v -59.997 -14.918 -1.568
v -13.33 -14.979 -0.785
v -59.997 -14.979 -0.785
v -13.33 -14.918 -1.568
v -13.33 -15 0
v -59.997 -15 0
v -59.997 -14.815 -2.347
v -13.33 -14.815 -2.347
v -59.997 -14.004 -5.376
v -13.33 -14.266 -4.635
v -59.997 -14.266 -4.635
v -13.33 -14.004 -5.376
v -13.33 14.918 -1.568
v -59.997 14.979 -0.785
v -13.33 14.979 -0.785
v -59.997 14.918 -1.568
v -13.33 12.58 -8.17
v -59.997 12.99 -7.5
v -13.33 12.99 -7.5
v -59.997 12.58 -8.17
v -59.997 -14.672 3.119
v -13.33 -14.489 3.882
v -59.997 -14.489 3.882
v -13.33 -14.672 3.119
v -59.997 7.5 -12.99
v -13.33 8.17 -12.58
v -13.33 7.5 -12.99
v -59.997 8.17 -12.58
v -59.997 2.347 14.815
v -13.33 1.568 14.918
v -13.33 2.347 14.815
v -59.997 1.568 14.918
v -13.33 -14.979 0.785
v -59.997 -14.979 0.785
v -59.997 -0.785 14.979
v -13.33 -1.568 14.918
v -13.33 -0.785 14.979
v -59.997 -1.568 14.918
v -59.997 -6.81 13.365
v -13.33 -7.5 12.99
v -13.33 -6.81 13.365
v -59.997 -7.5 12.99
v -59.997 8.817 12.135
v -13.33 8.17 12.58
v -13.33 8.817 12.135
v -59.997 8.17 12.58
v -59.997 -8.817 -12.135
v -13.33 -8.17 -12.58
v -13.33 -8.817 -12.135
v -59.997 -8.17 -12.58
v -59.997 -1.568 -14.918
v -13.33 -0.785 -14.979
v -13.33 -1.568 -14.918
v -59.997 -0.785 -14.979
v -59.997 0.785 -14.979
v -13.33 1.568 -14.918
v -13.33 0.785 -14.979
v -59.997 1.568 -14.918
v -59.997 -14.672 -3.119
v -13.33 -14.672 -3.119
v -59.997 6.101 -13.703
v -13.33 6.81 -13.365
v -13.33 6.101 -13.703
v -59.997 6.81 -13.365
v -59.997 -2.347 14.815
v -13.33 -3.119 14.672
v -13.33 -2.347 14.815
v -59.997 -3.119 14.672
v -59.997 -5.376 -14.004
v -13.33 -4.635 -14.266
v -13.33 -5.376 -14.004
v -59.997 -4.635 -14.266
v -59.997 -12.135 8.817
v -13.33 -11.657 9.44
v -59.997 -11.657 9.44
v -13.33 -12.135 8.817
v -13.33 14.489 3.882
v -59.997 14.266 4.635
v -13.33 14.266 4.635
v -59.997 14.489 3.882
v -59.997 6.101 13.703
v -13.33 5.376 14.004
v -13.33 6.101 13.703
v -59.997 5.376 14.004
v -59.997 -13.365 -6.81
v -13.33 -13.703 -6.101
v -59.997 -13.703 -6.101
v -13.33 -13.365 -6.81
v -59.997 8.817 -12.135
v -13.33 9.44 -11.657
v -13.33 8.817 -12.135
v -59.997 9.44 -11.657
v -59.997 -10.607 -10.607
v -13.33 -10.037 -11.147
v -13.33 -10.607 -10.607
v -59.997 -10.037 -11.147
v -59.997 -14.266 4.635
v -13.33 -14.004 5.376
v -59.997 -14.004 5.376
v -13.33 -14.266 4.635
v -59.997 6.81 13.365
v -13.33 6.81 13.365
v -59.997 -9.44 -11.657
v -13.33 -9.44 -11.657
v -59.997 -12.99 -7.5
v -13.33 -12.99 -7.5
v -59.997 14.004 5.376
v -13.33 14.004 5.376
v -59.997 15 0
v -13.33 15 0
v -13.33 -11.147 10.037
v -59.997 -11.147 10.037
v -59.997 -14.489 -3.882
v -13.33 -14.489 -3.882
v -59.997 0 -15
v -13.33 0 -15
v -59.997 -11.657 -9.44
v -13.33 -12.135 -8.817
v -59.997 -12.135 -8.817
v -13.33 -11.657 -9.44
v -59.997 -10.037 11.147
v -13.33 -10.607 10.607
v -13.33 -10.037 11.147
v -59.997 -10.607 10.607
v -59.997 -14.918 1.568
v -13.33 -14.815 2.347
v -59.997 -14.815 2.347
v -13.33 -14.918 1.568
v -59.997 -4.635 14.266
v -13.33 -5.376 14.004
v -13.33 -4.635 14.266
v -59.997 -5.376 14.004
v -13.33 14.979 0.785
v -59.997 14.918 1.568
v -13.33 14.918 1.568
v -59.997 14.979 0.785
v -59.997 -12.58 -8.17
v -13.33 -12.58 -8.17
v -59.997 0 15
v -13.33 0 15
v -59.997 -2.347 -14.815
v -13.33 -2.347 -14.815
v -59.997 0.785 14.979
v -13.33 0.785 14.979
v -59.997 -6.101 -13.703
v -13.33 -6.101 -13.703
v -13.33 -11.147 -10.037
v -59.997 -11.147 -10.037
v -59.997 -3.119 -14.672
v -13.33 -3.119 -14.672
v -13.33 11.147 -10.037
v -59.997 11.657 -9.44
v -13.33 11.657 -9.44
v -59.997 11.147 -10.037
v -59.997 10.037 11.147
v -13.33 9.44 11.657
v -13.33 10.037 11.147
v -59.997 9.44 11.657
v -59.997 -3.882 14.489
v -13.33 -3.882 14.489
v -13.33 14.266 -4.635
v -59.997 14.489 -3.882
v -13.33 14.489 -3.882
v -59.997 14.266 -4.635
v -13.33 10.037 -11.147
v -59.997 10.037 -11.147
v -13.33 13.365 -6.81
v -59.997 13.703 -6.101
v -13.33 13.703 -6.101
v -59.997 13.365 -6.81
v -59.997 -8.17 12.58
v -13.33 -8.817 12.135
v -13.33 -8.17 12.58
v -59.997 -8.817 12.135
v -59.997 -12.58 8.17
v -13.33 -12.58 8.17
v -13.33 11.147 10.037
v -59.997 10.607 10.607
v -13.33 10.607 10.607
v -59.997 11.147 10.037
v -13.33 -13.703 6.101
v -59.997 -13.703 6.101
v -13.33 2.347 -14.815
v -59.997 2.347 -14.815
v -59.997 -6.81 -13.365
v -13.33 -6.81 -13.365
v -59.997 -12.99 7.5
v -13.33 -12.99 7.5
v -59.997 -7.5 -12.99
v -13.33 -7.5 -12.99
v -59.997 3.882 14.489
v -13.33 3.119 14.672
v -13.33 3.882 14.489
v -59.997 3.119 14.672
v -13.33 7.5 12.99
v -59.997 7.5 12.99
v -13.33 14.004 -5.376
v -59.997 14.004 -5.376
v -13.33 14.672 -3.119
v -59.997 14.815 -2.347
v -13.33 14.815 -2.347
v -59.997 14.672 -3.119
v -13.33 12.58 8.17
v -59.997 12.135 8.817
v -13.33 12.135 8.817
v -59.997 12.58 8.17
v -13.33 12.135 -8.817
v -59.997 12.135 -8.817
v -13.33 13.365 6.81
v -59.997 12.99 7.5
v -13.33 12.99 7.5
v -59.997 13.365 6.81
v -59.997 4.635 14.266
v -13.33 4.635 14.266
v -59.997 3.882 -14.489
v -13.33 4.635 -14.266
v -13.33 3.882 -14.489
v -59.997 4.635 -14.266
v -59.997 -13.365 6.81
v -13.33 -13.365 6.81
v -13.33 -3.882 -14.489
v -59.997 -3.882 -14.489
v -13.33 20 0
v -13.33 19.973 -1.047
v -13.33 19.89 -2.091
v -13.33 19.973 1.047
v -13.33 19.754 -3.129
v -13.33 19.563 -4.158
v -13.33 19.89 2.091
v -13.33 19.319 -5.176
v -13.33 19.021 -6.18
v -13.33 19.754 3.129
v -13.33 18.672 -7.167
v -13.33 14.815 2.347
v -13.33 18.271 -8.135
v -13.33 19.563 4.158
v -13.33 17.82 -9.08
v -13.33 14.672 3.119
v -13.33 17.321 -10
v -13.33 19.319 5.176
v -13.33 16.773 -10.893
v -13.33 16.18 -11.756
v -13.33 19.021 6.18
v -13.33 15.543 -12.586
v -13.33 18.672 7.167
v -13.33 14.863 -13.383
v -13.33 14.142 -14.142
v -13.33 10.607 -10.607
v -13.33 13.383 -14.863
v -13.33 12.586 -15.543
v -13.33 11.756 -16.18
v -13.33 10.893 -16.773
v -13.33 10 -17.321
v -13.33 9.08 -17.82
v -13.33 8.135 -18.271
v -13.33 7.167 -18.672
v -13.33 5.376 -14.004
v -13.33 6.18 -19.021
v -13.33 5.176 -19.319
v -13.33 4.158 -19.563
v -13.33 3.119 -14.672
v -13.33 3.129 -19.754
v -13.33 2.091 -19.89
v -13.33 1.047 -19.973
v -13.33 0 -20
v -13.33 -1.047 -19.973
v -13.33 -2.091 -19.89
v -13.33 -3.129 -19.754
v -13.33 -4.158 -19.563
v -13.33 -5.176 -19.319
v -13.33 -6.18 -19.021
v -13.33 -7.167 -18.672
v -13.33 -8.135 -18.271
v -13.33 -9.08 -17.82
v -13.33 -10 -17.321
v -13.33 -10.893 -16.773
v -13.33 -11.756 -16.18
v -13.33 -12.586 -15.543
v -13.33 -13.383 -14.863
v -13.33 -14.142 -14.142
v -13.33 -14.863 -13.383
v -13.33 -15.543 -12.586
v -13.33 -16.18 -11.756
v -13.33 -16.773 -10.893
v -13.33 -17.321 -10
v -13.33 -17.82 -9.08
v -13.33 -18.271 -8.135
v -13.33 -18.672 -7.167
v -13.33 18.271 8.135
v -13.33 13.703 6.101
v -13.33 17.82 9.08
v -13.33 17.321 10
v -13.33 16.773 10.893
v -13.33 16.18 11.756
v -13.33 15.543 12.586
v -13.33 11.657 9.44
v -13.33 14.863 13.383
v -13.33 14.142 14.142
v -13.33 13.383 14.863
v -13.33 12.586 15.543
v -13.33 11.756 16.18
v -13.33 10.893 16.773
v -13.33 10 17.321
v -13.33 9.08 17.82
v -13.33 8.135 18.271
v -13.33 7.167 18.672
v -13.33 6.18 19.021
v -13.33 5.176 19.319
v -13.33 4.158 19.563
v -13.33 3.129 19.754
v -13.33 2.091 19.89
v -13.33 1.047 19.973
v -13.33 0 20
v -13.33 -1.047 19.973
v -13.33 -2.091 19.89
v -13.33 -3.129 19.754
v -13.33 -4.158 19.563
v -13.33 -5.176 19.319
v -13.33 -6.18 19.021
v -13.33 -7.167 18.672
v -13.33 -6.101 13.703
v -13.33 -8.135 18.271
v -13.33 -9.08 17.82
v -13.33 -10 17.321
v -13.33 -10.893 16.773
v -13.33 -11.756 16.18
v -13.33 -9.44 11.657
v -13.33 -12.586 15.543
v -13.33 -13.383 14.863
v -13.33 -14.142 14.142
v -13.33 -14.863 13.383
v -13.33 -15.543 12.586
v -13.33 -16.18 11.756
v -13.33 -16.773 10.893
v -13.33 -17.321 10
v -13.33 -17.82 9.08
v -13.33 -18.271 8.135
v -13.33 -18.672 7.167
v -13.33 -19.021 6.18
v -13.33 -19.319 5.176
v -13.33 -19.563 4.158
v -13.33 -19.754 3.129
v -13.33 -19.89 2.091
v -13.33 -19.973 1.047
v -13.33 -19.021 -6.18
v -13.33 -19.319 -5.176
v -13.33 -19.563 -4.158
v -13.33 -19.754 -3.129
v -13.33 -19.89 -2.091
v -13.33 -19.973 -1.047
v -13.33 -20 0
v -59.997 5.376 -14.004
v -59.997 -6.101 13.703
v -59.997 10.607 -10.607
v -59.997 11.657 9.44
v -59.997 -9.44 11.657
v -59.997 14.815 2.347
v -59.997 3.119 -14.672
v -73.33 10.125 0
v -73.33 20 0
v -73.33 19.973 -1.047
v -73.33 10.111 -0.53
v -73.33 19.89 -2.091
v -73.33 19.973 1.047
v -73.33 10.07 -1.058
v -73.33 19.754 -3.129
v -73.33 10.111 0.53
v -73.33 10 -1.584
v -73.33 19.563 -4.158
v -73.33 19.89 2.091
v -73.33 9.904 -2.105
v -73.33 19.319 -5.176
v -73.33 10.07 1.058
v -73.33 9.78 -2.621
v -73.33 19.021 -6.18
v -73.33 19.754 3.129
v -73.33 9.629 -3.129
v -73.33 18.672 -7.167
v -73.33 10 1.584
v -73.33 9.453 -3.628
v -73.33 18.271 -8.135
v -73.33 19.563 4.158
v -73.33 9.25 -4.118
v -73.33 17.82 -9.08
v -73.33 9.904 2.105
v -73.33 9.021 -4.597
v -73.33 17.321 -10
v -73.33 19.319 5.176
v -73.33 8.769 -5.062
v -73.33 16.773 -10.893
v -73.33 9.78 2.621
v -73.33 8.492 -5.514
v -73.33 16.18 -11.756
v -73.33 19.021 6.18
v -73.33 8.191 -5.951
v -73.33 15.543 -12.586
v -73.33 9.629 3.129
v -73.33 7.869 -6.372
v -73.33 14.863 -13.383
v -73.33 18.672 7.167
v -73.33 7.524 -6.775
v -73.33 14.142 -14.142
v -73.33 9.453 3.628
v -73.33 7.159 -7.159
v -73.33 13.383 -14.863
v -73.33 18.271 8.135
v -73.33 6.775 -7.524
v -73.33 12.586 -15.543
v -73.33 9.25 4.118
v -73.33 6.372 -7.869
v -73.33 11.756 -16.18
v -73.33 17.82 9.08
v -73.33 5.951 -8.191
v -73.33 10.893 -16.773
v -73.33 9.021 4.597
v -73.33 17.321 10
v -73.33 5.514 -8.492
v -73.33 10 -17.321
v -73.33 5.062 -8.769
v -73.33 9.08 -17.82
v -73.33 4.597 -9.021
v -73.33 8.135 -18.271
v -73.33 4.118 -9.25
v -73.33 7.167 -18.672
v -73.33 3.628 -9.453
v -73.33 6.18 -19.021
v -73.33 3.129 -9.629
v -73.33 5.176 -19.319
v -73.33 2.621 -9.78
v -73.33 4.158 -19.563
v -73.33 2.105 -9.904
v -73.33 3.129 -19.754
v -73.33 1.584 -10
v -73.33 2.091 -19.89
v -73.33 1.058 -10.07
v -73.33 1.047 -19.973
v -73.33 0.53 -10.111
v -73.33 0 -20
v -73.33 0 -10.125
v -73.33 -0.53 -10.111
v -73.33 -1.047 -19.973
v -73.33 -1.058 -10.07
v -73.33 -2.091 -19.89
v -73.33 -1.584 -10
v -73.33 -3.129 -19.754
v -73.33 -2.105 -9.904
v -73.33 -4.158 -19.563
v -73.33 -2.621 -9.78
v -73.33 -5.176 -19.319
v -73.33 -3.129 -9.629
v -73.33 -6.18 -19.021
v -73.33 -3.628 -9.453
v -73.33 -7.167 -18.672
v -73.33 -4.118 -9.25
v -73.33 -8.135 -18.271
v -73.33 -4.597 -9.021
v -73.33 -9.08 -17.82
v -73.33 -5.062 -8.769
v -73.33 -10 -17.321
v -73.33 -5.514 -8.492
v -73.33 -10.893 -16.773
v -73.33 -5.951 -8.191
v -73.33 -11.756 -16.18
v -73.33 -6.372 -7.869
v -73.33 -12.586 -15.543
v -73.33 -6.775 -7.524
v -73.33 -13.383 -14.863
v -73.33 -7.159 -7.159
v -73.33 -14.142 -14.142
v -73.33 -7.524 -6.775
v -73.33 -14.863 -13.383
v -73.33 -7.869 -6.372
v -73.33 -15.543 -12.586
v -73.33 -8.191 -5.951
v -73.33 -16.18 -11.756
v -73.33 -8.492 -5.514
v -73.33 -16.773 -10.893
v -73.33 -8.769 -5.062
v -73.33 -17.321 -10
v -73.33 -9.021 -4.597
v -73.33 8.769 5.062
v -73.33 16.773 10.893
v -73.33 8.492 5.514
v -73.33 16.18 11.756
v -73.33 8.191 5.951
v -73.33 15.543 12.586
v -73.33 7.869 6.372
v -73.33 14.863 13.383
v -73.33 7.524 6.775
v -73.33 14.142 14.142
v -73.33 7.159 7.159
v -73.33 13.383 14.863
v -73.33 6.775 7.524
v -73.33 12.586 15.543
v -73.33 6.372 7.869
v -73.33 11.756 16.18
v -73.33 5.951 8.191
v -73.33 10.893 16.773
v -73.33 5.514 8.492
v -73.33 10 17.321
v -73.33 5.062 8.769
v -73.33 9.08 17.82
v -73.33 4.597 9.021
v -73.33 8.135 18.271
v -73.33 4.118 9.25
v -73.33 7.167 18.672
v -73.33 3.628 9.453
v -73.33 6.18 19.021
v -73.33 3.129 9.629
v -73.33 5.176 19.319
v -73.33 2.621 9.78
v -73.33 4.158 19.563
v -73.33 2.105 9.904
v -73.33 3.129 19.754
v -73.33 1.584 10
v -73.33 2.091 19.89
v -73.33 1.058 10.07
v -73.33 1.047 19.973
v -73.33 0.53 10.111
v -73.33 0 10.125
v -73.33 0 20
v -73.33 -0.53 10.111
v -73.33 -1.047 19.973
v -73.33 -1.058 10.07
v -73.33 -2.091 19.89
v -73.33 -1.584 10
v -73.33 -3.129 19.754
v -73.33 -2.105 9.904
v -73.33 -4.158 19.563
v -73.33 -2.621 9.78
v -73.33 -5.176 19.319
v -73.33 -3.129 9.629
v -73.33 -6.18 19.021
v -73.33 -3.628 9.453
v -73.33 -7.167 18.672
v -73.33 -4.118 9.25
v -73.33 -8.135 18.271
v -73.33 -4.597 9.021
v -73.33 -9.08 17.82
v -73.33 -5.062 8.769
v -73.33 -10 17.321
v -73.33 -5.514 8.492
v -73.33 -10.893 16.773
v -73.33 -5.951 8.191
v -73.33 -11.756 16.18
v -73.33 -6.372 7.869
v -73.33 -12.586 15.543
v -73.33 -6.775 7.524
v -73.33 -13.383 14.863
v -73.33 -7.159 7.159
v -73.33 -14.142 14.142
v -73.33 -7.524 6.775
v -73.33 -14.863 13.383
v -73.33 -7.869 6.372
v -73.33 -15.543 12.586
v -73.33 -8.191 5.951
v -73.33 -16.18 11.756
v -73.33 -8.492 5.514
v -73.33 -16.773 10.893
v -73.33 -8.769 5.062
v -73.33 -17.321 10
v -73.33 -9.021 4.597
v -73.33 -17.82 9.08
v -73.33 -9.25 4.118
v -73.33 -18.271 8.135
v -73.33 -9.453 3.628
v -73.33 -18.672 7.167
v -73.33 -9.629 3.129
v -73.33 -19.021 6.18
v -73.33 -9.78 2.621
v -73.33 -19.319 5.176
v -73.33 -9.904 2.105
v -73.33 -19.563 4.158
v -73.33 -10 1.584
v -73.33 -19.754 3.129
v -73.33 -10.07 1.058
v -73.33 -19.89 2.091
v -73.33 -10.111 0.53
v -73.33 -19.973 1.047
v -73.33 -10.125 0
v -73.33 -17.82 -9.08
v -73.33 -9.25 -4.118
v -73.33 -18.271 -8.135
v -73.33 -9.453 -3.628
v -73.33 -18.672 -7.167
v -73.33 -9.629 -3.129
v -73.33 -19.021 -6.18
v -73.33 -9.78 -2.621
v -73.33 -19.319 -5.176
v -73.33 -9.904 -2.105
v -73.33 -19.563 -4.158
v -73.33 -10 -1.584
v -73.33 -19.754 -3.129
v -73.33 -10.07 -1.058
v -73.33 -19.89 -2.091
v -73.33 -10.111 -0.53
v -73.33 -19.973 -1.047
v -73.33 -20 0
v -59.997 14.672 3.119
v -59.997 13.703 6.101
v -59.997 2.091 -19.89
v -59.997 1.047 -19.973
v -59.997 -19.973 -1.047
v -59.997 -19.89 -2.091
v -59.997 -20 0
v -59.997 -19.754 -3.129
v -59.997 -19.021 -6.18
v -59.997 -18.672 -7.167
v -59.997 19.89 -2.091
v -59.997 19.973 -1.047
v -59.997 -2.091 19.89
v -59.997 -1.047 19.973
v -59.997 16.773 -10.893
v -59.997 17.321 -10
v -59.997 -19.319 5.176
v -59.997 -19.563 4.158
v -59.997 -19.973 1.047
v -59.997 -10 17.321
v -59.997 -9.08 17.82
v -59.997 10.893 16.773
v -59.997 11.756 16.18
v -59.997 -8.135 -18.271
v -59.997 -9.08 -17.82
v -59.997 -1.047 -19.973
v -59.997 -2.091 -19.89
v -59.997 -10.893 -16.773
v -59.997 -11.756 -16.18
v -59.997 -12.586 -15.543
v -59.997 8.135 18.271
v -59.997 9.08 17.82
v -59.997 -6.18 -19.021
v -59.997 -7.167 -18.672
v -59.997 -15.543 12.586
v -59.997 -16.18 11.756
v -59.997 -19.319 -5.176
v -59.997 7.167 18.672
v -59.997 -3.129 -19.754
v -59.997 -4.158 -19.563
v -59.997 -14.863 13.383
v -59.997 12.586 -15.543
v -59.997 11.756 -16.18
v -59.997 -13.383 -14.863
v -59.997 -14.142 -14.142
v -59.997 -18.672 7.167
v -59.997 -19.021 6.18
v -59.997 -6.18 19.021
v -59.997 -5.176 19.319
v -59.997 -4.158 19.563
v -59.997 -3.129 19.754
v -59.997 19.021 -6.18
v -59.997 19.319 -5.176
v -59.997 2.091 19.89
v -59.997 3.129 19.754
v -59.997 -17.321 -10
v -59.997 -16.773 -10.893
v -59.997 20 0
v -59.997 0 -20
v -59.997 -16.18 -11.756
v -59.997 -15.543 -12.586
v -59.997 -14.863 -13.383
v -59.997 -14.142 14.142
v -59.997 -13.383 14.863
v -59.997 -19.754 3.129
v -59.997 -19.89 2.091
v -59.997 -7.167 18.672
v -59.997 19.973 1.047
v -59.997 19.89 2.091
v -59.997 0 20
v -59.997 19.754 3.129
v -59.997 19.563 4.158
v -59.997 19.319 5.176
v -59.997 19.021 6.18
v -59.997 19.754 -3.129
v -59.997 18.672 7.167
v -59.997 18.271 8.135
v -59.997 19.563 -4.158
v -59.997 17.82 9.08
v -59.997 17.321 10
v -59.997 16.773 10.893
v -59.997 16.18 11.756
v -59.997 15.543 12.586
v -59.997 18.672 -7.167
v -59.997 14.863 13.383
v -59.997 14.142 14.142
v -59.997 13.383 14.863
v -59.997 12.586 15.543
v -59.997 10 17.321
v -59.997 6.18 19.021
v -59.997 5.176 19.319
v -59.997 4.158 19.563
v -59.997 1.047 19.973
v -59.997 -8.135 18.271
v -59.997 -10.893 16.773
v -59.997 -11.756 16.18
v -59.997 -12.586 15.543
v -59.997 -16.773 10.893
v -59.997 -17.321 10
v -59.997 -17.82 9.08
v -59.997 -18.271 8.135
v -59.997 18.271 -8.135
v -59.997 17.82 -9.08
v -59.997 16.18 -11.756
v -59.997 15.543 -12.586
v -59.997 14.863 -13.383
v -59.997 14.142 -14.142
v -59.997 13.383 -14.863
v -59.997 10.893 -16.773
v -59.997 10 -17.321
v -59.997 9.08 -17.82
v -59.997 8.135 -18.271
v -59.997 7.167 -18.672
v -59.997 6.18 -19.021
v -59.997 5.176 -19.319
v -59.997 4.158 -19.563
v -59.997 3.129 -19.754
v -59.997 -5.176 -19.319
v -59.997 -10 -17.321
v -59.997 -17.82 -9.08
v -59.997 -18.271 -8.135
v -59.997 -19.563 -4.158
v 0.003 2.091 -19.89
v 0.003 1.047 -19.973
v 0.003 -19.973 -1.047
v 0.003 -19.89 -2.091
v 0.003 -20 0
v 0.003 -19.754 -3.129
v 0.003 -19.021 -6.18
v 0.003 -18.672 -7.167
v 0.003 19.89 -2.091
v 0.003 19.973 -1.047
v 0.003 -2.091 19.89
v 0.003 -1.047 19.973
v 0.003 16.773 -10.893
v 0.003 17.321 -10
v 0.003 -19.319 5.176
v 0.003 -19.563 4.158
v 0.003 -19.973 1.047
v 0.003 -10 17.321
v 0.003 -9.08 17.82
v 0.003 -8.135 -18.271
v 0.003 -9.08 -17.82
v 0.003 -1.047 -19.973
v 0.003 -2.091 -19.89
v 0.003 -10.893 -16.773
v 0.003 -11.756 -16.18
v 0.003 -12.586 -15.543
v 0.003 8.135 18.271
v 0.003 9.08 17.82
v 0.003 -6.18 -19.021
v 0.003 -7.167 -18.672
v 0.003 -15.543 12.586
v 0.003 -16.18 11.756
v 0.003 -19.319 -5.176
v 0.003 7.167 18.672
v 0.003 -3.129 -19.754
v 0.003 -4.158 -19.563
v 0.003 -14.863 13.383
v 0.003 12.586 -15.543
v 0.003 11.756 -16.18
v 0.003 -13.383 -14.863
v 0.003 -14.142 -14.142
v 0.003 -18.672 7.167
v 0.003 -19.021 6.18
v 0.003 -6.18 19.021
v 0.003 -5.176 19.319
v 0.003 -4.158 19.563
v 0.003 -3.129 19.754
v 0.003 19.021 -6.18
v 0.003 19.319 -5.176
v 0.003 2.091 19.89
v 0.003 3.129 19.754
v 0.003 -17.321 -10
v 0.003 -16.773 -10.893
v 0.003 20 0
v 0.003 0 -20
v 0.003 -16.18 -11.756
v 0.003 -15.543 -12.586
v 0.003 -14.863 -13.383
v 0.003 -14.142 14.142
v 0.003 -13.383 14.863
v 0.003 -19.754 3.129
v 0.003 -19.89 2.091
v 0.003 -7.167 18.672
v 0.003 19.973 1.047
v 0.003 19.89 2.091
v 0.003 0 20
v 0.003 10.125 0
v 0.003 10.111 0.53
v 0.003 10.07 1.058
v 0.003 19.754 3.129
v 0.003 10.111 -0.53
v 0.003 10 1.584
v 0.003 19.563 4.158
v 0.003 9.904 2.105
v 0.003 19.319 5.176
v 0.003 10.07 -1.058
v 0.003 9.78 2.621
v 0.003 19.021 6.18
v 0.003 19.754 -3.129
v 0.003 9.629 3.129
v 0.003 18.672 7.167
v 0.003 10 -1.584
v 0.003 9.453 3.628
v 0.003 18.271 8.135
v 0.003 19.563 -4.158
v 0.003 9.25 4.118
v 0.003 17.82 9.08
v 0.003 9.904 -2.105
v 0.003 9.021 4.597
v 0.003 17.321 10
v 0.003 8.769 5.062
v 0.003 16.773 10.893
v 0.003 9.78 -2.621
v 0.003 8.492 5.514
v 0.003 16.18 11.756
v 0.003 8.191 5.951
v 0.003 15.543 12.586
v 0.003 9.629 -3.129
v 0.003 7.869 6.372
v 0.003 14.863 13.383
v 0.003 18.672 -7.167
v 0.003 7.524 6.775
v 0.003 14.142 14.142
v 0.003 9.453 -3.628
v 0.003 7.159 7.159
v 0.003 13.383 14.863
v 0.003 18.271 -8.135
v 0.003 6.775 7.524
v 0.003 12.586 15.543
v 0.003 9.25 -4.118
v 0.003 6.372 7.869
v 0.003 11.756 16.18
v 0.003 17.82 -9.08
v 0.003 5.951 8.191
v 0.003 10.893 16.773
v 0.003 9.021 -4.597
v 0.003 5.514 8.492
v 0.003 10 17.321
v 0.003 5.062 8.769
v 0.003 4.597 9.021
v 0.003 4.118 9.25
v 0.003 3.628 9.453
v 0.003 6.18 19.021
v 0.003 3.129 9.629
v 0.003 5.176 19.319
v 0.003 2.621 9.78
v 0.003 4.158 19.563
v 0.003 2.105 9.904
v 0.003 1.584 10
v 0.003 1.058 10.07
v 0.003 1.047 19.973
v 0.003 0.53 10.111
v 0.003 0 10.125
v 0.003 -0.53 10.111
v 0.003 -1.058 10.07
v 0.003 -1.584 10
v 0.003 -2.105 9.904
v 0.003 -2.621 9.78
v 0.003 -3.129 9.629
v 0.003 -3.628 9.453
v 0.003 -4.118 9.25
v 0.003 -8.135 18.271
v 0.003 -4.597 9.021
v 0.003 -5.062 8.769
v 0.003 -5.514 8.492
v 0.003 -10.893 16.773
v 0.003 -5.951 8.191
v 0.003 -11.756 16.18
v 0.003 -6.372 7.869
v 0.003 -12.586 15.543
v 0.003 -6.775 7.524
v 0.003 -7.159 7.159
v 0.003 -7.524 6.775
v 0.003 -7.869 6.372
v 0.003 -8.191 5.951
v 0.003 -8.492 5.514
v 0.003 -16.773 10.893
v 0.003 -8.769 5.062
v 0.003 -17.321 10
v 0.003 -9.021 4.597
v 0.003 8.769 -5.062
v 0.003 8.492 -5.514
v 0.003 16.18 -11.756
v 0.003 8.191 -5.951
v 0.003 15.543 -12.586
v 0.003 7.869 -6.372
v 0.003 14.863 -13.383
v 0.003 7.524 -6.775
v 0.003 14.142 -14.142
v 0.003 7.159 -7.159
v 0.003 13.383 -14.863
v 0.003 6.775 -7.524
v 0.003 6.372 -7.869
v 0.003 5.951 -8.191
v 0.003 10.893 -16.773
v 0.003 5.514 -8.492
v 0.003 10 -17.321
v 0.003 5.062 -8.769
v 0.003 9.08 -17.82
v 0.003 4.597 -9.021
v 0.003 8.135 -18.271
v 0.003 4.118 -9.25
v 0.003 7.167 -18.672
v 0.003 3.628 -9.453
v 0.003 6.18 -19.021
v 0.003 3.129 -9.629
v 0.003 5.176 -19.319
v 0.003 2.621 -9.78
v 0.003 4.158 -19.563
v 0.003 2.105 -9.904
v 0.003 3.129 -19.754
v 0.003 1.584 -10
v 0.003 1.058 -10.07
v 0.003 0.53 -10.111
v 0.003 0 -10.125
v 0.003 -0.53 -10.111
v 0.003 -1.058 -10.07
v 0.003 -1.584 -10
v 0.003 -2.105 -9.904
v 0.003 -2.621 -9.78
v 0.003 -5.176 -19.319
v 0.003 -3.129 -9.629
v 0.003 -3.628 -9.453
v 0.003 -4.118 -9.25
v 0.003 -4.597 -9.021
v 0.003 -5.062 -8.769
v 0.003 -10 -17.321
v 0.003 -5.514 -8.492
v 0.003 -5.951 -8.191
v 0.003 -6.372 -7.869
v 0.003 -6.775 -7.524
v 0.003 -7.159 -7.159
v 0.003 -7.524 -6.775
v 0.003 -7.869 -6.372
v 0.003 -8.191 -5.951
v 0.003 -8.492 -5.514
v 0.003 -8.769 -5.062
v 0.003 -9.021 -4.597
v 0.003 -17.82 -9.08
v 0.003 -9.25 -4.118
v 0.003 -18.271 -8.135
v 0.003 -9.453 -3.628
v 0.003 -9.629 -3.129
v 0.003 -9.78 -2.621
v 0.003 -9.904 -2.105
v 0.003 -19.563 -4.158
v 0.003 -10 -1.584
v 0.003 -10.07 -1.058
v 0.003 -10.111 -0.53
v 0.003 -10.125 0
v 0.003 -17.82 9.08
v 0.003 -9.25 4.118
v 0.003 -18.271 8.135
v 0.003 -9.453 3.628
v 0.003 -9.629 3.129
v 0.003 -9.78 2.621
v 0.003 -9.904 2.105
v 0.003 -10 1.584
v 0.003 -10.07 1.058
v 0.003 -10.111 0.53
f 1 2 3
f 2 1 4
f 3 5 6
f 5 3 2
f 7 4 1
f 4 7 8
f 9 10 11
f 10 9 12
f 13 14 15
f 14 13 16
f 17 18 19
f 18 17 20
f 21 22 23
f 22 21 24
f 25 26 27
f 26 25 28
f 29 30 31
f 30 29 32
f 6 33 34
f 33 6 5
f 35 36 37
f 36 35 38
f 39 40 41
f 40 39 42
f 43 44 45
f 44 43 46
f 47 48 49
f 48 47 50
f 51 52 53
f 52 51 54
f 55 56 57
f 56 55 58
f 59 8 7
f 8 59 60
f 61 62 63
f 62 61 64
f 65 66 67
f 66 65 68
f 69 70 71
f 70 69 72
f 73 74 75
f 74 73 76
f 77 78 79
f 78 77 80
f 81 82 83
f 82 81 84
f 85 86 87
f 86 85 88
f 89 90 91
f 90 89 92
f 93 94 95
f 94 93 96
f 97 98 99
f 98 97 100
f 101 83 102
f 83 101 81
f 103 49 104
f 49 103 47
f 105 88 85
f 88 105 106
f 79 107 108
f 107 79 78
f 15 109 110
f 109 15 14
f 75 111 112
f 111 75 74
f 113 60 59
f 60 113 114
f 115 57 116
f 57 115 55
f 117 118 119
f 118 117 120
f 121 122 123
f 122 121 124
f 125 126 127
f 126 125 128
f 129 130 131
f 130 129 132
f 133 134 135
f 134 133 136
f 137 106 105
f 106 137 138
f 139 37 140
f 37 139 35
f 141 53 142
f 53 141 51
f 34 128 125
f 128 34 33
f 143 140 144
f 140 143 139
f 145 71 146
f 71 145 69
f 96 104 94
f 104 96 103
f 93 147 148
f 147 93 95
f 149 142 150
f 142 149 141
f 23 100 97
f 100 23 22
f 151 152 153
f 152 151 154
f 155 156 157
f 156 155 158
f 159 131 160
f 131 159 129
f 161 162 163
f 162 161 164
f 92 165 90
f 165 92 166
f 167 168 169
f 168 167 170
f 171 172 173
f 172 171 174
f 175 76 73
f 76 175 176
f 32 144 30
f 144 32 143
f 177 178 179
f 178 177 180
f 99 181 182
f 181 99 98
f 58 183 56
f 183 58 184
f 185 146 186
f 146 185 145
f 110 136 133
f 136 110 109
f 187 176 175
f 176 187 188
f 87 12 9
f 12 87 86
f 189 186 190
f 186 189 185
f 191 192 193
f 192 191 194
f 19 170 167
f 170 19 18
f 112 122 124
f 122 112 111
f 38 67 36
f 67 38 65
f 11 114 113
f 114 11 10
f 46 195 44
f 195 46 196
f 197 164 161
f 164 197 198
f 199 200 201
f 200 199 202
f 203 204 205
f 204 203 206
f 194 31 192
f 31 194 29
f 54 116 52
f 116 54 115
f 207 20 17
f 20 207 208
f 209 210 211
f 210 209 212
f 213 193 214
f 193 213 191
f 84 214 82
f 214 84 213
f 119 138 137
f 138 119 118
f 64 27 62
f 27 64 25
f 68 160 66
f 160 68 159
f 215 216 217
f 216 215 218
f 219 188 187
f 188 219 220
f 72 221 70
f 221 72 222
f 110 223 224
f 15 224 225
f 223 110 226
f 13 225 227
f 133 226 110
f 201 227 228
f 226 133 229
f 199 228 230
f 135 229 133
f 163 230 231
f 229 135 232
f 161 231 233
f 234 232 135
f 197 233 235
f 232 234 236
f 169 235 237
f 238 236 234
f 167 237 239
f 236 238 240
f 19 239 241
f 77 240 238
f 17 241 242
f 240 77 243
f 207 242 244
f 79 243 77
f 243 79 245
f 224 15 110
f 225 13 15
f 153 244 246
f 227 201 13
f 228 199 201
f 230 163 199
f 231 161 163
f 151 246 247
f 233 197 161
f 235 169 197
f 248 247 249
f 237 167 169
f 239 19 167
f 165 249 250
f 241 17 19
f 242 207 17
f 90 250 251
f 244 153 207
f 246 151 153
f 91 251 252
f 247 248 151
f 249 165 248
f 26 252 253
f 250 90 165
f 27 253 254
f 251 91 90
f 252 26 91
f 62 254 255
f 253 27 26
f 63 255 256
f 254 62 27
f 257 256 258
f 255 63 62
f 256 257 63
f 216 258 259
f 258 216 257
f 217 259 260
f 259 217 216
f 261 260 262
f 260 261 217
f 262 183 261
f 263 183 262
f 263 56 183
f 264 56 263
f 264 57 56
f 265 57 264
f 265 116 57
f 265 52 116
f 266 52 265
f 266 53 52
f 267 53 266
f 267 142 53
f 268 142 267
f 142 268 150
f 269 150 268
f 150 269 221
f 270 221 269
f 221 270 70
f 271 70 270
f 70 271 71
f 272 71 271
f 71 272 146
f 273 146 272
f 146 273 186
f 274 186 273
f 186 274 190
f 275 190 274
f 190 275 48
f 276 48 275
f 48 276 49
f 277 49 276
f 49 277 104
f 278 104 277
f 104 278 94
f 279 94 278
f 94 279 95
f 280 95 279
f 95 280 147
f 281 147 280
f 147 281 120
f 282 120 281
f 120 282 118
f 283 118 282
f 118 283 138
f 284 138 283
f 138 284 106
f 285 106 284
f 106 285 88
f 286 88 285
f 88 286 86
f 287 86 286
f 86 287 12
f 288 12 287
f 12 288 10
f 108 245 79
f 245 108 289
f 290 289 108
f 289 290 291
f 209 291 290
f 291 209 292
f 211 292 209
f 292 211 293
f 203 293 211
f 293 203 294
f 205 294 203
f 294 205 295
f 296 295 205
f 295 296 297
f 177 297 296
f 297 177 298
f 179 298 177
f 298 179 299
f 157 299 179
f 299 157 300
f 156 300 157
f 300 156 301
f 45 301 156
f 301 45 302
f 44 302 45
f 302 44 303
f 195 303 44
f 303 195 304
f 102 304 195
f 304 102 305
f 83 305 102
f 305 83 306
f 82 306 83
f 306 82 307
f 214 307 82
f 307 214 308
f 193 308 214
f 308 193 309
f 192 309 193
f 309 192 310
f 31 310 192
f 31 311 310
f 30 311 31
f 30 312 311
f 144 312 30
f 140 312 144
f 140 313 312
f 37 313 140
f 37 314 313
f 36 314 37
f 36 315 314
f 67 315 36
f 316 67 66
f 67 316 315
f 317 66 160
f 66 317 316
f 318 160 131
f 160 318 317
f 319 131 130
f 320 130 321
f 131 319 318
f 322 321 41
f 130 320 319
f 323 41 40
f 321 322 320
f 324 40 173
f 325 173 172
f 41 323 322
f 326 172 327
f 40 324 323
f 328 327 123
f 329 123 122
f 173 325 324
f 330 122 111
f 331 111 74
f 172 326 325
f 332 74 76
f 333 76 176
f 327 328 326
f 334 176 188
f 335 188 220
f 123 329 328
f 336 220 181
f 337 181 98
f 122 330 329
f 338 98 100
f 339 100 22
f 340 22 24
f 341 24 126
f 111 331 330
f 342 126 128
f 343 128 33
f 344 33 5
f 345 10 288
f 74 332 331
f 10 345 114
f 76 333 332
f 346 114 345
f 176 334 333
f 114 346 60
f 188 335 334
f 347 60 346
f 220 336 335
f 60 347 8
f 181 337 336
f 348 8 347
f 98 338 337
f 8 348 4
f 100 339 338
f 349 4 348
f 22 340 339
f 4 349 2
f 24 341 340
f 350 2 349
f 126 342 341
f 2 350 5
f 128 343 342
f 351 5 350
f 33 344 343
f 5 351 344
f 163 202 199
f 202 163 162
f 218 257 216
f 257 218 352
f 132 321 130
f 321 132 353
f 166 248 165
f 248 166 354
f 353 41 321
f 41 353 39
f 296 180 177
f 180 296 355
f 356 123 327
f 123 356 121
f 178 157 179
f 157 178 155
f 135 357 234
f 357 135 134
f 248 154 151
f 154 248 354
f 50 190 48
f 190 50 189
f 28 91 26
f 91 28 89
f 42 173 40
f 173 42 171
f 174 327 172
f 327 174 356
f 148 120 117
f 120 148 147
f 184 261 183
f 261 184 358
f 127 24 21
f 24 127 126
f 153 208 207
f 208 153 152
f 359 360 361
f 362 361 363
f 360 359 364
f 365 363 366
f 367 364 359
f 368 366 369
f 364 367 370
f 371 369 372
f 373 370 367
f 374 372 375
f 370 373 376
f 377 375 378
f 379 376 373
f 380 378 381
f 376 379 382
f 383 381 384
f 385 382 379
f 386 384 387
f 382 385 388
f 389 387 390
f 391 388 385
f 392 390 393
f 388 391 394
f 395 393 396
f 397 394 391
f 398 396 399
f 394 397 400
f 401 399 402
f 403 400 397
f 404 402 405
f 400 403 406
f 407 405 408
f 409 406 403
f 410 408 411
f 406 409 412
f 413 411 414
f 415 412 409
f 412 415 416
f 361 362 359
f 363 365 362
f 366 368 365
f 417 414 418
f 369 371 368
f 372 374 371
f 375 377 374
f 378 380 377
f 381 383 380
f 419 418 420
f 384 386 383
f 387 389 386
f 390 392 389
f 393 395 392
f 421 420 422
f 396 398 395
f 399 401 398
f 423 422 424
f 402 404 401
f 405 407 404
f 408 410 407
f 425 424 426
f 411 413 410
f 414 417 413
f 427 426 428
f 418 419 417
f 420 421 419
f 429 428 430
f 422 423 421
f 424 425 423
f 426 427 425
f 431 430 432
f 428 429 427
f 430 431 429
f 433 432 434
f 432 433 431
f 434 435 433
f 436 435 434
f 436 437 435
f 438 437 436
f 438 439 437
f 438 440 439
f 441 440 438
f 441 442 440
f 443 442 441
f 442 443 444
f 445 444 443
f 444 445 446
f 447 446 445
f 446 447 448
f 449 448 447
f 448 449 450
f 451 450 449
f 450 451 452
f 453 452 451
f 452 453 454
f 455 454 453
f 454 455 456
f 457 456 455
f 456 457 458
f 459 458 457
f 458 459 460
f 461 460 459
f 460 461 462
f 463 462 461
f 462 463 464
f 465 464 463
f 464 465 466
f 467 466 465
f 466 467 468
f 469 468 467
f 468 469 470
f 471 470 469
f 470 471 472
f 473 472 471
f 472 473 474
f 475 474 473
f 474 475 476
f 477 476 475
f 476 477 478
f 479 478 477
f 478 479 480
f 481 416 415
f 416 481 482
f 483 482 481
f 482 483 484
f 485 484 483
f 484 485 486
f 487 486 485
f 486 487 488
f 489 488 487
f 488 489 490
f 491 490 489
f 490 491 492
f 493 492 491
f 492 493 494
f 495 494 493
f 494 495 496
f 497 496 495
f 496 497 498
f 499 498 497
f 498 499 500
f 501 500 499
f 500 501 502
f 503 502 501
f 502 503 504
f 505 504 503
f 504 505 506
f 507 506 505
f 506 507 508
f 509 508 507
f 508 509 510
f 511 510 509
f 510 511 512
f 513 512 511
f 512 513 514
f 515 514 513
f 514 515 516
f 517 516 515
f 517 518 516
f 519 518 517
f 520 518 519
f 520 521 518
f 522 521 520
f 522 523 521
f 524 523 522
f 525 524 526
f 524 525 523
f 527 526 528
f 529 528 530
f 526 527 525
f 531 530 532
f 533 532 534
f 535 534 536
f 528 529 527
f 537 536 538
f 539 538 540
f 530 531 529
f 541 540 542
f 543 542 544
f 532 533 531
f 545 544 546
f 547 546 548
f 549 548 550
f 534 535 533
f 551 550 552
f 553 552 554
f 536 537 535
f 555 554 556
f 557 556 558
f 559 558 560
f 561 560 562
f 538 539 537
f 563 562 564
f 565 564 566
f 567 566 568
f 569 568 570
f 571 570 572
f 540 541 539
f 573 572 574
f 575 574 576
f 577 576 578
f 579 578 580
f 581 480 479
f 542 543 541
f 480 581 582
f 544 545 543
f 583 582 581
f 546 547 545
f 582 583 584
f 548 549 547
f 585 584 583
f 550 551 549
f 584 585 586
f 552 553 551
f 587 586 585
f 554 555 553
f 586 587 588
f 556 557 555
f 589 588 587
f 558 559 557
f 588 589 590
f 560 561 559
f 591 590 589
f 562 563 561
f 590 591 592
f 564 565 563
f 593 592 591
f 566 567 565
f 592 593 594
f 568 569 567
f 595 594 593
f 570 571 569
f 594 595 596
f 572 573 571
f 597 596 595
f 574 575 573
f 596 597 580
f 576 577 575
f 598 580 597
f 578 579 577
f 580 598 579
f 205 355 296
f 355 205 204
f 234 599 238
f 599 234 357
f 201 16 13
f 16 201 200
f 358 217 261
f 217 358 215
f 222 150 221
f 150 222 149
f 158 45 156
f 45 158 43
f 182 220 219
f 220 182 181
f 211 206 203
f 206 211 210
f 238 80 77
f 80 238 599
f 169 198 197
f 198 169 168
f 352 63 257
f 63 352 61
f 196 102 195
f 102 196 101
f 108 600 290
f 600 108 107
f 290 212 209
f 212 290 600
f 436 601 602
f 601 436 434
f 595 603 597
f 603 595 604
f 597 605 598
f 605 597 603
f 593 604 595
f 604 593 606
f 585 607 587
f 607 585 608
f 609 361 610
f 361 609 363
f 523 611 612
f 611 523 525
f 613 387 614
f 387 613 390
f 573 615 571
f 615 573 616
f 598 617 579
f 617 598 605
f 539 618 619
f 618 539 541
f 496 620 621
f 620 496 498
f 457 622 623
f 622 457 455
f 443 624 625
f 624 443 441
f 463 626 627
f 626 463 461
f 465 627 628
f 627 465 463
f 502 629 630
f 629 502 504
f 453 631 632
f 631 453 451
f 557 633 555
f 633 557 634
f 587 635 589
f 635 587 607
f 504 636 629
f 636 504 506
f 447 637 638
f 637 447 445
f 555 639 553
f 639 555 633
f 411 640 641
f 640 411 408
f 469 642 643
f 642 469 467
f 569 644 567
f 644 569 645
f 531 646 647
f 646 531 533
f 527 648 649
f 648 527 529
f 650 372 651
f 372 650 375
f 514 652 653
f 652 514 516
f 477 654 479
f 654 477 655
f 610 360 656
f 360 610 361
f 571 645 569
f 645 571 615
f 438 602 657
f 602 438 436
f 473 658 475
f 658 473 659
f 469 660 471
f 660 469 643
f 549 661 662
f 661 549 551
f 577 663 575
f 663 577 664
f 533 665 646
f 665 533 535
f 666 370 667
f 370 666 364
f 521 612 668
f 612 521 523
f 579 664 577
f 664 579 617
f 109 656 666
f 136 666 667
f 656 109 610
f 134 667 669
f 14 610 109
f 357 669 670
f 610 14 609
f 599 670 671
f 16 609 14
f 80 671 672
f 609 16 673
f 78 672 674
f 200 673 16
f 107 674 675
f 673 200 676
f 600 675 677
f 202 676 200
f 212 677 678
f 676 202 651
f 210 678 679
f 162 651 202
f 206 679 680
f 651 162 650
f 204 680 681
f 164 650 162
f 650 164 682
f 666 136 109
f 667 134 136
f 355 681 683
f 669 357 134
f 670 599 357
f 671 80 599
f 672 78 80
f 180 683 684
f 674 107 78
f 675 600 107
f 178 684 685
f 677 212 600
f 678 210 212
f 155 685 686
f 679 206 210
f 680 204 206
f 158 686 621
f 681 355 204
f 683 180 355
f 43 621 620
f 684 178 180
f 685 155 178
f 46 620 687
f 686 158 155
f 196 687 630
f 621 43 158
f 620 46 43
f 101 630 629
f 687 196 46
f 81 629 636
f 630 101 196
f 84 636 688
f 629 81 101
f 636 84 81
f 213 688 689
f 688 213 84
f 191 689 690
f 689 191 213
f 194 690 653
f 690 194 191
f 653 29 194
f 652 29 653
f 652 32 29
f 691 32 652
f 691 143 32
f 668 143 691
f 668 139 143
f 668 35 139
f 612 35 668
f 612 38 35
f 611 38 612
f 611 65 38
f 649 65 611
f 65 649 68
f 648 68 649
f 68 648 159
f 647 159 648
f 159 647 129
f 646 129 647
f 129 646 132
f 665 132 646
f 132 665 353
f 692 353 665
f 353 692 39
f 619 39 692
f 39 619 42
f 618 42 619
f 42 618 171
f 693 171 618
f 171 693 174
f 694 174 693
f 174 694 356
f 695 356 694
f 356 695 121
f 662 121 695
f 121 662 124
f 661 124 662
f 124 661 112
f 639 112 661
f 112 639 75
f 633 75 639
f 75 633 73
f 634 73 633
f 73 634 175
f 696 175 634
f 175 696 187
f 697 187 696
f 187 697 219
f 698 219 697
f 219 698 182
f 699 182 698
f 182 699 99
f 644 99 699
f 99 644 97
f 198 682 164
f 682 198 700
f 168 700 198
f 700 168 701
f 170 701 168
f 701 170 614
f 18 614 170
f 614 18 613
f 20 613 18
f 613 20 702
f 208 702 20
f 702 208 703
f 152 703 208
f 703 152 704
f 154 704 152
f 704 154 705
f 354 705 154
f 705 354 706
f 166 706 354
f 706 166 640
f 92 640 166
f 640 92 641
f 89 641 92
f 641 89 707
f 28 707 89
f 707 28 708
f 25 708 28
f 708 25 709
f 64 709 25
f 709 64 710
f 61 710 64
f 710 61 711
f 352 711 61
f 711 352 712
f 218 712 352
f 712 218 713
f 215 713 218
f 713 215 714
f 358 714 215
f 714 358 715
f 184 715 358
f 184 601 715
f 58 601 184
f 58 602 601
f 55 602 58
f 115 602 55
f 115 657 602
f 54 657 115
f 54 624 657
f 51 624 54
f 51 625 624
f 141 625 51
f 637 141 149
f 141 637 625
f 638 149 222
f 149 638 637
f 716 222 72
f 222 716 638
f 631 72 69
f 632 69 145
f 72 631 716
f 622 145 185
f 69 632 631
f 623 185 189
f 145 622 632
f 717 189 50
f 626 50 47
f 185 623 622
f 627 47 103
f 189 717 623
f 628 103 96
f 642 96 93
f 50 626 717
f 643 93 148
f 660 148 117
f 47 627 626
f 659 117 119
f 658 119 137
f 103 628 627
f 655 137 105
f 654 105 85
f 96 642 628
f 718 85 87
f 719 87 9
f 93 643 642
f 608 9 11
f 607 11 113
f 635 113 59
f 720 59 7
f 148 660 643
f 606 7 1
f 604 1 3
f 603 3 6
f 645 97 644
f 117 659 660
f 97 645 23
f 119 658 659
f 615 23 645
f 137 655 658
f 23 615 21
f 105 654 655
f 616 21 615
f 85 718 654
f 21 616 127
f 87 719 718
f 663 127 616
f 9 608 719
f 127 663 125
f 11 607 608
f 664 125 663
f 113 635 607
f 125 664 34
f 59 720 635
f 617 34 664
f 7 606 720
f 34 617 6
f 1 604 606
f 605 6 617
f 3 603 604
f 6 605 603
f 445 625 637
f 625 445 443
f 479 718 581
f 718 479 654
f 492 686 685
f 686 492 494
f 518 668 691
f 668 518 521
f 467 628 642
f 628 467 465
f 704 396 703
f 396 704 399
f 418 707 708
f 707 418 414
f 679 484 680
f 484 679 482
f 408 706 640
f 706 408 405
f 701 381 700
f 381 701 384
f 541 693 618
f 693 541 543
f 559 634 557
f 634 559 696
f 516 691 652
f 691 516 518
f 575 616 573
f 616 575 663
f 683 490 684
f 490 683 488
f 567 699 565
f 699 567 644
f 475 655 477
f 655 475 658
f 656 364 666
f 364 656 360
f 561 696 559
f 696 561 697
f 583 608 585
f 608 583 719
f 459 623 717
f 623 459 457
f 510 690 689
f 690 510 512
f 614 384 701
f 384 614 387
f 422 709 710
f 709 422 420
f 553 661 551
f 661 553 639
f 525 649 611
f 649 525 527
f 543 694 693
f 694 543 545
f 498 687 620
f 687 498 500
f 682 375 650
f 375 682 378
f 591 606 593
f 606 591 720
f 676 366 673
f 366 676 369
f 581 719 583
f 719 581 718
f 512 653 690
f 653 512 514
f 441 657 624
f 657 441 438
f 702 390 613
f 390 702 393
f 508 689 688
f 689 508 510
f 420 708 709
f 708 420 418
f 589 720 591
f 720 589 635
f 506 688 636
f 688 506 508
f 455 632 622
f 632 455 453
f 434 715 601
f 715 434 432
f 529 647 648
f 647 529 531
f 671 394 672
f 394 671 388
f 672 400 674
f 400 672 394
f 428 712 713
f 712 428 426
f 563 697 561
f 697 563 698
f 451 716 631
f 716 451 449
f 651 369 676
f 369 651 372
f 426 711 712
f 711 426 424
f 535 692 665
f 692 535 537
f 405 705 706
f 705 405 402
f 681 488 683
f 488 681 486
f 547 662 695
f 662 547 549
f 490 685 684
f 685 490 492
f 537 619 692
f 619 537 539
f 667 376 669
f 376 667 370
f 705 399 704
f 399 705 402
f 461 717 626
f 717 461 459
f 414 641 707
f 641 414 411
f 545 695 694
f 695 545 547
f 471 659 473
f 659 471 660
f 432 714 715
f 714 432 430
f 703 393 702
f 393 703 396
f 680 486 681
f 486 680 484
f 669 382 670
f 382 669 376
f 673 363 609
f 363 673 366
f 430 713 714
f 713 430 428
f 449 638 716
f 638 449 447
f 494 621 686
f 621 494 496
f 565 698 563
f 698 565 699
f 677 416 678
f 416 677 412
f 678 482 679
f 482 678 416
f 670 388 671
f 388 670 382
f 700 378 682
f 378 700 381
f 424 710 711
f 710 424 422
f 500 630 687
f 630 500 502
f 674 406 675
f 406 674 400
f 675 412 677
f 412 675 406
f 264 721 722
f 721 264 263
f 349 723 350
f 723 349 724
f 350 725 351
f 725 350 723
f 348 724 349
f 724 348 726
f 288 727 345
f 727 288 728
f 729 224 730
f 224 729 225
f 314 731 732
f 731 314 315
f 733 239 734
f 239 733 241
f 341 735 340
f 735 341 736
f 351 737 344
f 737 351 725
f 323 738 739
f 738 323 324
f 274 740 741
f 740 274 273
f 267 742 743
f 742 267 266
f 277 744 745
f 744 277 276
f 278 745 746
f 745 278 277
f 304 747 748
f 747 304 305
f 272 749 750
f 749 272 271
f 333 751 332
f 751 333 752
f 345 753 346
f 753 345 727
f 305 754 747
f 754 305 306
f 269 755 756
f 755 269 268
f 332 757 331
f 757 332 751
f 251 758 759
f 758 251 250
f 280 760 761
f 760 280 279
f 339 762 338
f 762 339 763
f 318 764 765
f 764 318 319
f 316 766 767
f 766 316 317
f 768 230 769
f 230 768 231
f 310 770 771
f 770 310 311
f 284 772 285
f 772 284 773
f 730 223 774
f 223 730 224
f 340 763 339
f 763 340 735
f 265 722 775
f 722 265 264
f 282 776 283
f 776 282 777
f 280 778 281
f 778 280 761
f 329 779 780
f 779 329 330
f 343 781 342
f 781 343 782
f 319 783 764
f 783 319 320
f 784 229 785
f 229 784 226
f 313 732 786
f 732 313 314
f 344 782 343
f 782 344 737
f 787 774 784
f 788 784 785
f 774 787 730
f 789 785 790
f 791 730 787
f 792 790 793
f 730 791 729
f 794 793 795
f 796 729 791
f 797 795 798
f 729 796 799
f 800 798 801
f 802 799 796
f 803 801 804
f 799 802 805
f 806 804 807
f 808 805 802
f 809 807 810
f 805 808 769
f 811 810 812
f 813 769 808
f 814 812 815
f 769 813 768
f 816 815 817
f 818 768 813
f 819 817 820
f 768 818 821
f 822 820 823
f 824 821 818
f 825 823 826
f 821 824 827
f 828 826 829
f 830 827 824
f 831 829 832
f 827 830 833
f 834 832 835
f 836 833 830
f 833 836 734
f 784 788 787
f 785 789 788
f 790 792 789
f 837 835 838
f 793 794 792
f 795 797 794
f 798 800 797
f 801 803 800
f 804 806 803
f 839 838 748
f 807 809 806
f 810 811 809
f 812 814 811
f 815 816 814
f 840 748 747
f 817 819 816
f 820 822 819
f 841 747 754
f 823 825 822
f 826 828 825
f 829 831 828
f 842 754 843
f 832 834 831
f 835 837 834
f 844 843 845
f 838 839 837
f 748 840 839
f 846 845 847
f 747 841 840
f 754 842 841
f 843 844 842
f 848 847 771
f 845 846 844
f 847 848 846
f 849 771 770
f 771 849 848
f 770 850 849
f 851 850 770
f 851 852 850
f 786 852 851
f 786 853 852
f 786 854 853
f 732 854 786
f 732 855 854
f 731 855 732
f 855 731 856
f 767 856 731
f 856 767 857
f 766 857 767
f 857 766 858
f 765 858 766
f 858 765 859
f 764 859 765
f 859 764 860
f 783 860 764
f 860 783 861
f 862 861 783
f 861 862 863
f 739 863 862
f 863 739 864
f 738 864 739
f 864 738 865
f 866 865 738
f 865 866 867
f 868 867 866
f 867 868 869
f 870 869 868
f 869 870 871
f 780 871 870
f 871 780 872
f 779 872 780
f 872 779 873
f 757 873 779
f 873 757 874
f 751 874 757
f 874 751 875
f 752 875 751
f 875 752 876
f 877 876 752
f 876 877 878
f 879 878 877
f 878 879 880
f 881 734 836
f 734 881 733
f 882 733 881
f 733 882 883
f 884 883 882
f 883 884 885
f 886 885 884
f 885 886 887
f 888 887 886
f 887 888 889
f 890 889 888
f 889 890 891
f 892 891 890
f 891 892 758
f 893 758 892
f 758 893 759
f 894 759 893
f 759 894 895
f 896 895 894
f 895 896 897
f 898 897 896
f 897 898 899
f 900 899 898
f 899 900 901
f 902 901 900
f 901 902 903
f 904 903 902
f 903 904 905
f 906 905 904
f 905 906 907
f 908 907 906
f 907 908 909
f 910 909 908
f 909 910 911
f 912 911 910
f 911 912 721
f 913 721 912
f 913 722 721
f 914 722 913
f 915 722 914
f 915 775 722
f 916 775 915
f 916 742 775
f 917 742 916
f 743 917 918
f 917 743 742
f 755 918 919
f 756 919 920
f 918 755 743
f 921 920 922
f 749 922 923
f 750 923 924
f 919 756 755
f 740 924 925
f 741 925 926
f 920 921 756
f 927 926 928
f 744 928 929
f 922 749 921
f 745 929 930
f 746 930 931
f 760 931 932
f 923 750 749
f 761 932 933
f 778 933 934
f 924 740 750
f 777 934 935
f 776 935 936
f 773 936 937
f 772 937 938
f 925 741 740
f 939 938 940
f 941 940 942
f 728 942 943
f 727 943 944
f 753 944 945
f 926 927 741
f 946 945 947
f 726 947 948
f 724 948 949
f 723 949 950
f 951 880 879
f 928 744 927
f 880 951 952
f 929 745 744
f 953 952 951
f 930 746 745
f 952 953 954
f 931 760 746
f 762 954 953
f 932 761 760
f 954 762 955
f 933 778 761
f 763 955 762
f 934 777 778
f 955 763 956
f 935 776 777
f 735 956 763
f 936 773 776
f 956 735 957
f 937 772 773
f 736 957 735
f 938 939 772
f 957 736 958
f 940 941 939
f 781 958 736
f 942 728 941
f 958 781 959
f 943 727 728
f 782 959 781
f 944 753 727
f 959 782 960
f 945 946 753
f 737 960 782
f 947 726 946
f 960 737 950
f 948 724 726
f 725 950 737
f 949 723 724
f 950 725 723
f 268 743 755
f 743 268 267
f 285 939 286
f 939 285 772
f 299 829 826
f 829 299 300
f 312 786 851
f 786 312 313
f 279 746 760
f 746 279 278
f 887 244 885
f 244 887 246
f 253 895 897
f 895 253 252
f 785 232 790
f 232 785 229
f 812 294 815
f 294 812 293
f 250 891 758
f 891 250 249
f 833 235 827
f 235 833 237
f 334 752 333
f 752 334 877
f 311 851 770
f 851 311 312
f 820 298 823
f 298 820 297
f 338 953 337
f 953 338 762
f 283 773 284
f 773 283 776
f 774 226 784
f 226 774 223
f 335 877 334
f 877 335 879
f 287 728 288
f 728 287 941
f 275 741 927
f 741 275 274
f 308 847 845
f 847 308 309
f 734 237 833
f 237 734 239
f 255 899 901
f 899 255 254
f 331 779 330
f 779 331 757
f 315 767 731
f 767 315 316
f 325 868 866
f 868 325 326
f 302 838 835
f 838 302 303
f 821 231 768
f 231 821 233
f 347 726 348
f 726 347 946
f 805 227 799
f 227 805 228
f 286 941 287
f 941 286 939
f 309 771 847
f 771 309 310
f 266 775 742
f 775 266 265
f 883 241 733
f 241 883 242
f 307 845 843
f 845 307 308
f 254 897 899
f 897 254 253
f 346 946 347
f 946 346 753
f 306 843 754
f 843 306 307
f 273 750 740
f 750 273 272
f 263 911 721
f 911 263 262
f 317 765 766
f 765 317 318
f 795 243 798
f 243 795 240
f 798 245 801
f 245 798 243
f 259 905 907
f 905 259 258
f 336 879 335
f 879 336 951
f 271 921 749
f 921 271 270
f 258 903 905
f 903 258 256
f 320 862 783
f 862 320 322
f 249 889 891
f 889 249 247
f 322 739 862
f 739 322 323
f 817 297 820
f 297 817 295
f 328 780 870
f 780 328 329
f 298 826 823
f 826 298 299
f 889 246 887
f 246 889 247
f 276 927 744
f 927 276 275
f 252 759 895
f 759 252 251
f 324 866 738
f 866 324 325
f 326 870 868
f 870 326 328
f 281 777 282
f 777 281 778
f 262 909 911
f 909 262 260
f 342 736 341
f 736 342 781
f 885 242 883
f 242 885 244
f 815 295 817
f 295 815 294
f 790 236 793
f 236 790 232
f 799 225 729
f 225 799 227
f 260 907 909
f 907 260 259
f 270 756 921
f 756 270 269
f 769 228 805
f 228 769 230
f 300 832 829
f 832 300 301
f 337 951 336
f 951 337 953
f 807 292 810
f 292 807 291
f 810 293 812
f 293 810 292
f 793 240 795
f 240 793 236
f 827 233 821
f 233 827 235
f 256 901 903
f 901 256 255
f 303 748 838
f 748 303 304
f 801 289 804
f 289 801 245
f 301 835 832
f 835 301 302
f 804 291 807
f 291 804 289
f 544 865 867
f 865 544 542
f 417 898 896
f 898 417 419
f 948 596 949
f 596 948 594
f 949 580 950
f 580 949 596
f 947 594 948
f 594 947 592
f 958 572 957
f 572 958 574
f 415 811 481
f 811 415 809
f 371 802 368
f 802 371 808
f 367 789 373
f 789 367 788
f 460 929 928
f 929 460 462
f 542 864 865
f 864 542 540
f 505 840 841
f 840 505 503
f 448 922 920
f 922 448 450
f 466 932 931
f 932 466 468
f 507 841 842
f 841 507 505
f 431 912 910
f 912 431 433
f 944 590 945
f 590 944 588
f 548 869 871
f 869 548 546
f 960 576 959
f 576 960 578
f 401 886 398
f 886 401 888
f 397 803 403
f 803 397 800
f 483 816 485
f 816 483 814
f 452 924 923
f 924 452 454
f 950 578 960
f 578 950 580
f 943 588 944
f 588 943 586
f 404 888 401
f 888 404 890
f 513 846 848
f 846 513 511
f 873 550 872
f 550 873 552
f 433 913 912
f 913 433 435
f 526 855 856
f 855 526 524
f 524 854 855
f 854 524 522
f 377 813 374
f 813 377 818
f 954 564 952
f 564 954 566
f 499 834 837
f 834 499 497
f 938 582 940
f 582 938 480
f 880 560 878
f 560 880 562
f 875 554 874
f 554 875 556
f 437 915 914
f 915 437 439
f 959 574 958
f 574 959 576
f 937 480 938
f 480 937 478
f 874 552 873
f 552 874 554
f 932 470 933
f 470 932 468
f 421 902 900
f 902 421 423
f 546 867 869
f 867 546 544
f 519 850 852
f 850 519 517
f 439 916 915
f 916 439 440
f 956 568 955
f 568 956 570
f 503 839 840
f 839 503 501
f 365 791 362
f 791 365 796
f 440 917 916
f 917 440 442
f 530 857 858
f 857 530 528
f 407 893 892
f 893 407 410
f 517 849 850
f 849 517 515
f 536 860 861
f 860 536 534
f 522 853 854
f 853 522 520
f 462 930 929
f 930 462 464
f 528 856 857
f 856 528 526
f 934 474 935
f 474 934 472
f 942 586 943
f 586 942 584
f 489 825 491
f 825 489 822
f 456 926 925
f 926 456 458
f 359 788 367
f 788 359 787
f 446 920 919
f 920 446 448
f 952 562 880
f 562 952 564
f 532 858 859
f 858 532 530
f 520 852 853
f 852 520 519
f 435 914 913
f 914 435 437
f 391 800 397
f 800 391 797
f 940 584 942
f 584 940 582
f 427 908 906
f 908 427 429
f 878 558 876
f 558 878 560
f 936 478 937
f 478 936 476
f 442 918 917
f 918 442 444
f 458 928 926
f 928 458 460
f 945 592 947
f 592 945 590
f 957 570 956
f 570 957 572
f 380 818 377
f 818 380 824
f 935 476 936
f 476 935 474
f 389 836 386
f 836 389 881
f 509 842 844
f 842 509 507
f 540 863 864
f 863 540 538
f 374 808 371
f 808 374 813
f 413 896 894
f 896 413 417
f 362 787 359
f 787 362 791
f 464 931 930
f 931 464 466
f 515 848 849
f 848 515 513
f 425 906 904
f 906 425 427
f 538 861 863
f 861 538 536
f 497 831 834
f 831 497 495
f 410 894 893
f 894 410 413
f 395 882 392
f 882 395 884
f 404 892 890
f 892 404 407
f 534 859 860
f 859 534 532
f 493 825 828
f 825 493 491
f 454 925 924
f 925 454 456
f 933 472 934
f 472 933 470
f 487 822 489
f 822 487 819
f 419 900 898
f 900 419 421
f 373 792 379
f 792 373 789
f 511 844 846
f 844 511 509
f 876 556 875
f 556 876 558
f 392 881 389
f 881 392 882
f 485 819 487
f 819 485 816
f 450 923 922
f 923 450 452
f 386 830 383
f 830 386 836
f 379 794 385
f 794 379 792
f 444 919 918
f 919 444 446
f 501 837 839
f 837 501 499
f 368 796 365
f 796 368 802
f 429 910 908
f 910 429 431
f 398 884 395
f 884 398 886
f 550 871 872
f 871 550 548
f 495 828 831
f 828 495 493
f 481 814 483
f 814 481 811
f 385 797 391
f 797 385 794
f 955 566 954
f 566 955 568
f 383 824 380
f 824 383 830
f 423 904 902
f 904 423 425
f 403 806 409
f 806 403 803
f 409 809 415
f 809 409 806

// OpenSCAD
// file: spindleFlange.scad
include <./config.scad>

    flangeGap = 0.25;
    drillSize = 6;
    screwSize = 4;

module spindleFlange(parts = false) {



    module partsList() {
        // Spindelplatte
        echo(str("43;Flanschen - Rundstahl gedrechselt - Bohrung Madenschraube ", drillSize , "mm - Bohrung Stahlseil ", drillSize , "mm 25°/ 25°;2;", spindleDiameter * 3, ";", spindleDiameter * 2, ";", spindleDiameter * 3));
    }

    rotate([0, 0,-90])
    difference() {
        // Körper
        union() {
            // Inner
            cylinder(d = spindleDiameter * 1.5, h = spindleDiameter * 3);
            // Outer
            cylinder(d = spindleDiameter * 2, h = spindleDiameter / 1.5);
            translate([0, 0, spindleDiameter * 3])
            cylinder(d = spindleDiameter * 2, h = spindleDiameter / 1.5);
        }

        // Spindel
        translate([0, 0, -spindleDiameter / 2 - spindleDiameter])
        cylinder(h = spindleDiameter * 6, d = spindleDiameter + flangeGap);

        // // Madenschraube und Aufnahme für Stahlseil
        // translate([0, 0, spindleDiameter / 2]) {

        //     // Bohrloch Fixierung
        //     rotate([0, 90, 0])
        //     translate([-spindleDiameter, 0, -spindleDiameter - (spindleDiameter / 4)])
        //     #cylinder(h = spindleDiameter, d = screwSize);

        //     // Aufnahme Stahlseil
        //     rotate([0, 90, 90])
        //     translate([-spindleDiameter * 2, 0, -spindleDiameter - (spindleDiameter / 5)])
        //     #cylinder(h = spindleDiameter*3, d = drillSize);
        // }
    }

    if (parts == true) {
        partsList();
    }
}


module drawSpindleFlangeTopProjection() {
    // // Draufsicht
    translate([spindleDiameter, -spindleDiameter, 0])
    projection() {
        rotate([0,0,0])
        spindleFlange();
    }
}

module drawSpindleFlangeSideProjection() {
    // // Draufsicht
    translate([0, -spindleDiameter, 0])
    projection() {
        rotate([0,90,0])
        spindleFlange();
    }
}


module spindleFlangeMeasuermentLinesLength() {
    color([0/255, 0/255, 0/255]) translate([0, 20, 0]) {

        square([lineThickness,lineGap*2 + 20]);

        translate([spindleDiameter / 1.5, 0, 0])
        square([lineThickness,lineGap + 20]);


        translate([spindleDiameter * 3, 0, 0])
        square([lineThickness,lineGap + 20]);


        translate([spindleDiameter * 3 + spindleDiameter / 1.5, 0, 0])
        square([lineThickness,lineGap*2 + 20]);


        translate([-20, lineGap*2, 0]) {
            length = spindleDiameter * 3 + spindleDiameter / 1.5 + 40;

            translate([length / 3 + 5, 15, 0])
            text(size = textSize, str(ceil(spindleDiameter * 3 + spindleDiameter / 1.5)));

            square([length, lineThickness]);
        }

        translate([-20, lineGap, 0]) {
            length = spindleDiameter * 3 + spindleDiameter / 1.5 + 40;


            translate([5, 15, 0])
            text(size = textSize, str(round(spindleDiameter / 1.5)));


            translate([length - 35, 15, 0])
            text(size = textSize, str(round(spindleDiameter / 1.5)));


            translate([length / 3 + 5, 15, 0])
            text(size = textSize, str(ceil(spindleDiameter * 3 + spindleDiameter / 1.5) - round(spindleDiameter/1.5) * 2 ));



            square([length, lineThickness]);
        }


        // translate([spindleDiameter * 3 + spindleDiameter / 1.5, -lineGap*2 - 20, 0])
        // square([lineThickness,lineGap + 20]);

        // translate([spindleDiameter * 2.5, -lineGap*2 - 40, 0])
        // #square([lineThickness,lineGap + 40]);



        // //translate([0, -lineGap*2 - 20, 0])
        // //square([lineThickness,lineGap + 20]);

        // translate([20, -lineGap*2, 0]) {
        //     length = spindleDiameter * 3 + spindleDiameter / 1.5;

        //     translate([length / 3 + 5, 15, 0])
        //     text(size = textSize, str(ceil(spindleDiameter * 3 + spindleDiameter / 1.5)));

        //     square([length, lineThickness]);
        // }


    }
}




module spindleFlangeMeasuermentLinesWidth() {
    color([0/255, 0/255, 0/255]) translate([0, 20, 0]) {

        square([lineThickness,lineGap*2 + 20]);

        translate([spindleDiameter / 2, 0, 0])
        square([lineThickness,lineGap + 20]);


        translate([spindleDiameter + spindleDiameter / 2, 0, 0])
        square([lineThickness,lineGap + 20]);


        translate([spindleDiameter * 2, 0, 0])
        square([lineThickness,lineGap*2 + 20]);


        translate([-20, lineGap*2, 0]) {
            length = spindleDiameter * 2 + 40;

            translate([spindleDiameter + 5, 15, 0])
            text(size = textSize, str(spindleDiameter * 2));

            square([length, lineThickness]);
        }

        translate([-20, lineGap, 0]) {
            length = spindleDiameter * 2 + 40;

            translate([spindleDiameter + 5, 15, 0])
            text(size = textSize, str(spindleDiameter + 0.1));

            square([length, lineThickness]);
        }

    }
}
// file: config.scad
drawReferences = false;
drawReferenceWall = false;

outerWidth = 1500;
outerDepth = 700;
outerHeight = 700;

profileSize = 40;

fireBasketHeight = 250;
fireBasketWidth = 400;
fireBasketGroundClearance = 100;
fireBasketFrontOpen = true;

spindleDiameter  = 20;
spindleOverlength = 5;
spindleWallExtension = 140;
spindleWheelDiameter = 200;
spindlePlateThickness = 5;
spindlePlateGap = 2;
spindleHandleThickness = 8;

grateGap = 4;
grateSize = 30;
grateProfileThickness = 3;

lineThickness = 1;
lineGap = 80;
textSize = 20;

$fn = 120;
// main file
include <./config.scad>
include <./spindleFlange.scad>


color([200/255, 200/255, 100/255])
rotate([0, 90, 0])
translate([0, 0, -spindleDiameter * 3.5 - 3.33])
spindleFlange();
